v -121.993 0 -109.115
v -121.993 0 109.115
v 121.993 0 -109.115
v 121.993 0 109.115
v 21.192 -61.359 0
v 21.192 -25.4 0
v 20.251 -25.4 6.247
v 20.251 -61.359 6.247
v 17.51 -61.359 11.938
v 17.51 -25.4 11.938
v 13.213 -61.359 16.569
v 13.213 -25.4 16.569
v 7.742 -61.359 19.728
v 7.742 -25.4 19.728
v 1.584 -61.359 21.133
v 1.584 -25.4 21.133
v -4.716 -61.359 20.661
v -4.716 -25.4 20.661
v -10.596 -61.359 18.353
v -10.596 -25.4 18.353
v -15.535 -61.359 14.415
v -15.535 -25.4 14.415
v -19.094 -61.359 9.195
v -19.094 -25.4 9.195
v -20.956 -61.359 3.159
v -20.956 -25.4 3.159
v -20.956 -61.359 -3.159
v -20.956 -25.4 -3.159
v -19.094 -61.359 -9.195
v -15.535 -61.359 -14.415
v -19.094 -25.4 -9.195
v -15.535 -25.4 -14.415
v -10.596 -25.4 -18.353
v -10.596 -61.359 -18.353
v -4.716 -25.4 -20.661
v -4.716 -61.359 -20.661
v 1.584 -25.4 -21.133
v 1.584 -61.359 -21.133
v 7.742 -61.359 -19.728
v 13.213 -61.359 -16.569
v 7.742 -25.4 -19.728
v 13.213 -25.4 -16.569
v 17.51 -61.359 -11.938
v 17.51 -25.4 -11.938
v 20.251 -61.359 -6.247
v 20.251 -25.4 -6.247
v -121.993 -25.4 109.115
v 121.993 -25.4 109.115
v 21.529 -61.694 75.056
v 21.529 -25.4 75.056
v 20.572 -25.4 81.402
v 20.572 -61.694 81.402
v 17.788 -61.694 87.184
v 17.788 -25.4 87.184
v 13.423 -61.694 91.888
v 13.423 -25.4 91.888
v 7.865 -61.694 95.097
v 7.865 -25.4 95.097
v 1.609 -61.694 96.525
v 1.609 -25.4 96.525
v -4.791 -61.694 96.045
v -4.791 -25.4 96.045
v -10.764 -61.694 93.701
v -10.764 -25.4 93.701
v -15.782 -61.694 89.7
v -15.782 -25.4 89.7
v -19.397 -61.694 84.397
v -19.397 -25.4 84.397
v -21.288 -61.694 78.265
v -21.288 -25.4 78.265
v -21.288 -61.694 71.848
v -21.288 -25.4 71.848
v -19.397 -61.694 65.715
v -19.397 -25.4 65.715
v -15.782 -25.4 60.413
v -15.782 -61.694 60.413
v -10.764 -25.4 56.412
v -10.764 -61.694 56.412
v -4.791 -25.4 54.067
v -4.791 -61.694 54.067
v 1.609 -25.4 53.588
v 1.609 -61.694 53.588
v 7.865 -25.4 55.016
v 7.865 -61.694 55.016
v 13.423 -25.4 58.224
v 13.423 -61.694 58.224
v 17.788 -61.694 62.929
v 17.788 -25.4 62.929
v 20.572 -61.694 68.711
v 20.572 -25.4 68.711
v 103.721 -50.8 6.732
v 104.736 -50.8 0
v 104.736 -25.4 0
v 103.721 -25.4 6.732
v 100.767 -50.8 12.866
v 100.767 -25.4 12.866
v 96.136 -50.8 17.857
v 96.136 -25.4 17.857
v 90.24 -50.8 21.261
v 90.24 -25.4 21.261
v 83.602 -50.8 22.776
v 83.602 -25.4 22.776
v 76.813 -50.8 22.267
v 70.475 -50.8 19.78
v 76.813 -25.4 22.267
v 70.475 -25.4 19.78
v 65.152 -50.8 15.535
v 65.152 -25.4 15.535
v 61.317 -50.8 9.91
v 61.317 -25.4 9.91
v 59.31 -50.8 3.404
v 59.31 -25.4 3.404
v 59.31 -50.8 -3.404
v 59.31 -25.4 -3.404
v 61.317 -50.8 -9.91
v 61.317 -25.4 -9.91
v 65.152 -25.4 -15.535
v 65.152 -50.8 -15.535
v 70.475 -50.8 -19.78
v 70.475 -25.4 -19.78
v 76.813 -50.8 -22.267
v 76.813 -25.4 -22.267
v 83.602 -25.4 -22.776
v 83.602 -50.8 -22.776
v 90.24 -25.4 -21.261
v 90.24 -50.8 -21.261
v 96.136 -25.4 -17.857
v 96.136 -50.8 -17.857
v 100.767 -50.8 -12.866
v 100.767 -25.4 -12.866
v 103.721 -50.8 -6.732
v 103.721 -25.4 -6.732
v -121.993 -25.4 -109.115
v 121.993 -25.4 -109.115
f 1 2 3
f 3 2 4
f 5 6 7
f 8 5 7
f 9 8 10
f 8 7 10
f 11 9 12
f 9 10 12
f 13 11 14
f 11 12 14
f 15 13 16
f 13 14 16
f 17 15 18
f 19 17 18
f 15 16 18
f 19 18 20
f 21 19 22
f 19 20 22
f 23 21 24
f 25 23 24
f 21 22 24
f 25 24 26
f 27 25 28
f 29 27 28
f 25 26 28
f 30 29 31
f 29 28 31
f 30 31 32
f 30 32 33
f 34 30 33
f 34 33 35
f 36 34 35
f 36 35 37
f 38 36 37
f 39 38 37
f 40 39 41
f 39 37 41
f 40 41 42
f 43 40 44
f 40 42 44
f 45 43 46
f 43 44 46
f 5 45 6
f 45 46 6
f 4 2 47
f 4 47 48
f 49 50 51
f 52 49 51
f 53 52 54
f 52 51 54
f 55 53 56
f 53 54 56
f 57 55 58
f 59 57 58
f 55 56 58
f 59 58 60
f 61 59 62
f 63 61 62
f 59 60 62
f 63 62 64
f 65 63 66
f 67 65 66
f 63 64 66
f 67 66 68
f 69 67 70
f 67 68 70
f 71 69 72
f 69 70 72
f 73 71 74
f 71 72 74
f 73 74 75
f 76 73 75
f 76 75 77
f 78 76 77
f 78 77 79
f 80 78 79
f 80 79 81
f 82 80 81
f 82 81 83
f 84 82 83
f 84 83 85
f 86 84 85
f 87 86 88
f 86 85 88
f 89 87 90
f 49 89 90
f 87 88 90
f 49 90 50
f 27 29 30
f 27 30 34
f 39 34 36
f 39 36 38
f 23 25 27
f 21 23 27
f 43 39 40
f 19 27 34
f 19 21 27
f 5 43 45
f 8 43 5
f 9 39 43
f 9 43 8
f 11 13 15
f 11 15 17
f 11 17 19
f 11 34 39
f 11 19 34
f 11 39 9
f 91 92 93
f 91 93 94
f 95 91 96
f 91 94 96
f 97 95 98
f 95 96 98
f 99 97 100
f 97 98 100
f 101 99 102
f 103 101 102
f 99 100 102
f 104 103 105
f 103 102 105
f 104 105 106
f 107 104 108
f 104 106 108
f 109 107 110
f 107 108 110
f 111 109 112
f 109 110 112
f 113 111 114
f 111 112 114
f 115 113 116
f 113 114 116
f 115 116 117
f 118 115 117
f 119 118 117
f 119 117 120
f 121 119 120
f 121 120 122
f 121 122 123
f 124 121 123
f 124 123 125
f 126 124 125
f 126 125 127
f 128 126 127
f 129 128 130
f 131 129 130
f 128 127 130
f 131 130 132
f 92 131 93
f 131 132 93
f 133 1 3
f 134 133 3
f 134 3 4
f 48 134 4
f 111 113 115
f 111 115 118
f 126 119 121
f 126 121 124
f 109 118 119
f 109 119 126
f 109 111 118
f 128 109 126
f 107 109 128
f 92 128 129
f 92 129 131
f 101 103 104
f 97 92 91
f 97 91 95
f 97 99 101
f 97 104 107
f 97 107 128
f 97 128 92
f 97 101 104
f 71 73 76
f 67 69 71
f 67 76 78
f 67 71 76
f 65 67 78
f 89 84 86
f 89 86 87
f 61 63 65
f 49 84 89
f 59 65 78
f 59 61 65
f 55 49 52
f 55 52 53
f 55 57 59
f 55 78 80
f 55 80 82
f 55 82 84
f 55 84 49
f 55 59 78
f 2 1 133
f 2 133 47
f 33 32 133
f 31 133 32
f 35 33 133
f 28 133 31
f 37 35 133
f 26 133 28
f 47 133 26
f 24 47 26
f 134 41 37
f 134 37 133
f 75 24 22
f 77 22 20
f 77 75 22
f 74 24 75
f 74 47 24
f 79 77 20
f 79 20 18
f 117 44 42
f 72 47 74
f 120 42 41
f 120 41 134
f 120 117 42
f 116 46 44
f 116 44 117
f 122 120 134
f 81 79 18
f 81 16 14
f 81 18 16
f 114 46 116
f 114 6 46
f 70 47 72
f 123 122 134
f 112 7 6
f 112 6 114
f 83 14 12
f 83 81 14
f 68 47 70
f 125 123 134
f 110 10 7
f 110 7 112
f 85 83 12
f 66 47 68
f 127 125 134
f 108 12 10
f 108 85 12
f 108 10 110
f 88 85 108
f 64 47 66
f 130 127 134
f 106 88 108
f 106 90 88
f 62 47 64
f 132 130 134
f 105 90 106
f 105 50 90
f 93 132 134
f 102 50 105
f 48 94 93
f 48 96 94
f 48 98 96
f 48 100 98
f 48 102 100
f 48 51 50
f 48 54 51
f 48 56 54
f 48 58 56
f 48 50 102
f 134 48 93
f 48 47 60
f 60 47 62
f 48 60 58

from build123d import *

# Parameters (mm, degrees)
F0_W     = 243.986786
F0_H     = 218.229026
F1_DEPTH = 25.4
F2_R     = 21.192457
F3_DEPTH = 35.958676
F4_R     = 21.528867
F5_DEPTH = 36.293864
F6_R     = 22.840136
F7_DEPTH = 25.4


with BuildPart() as f1:
    # F0 (on Front) → F1 (new body)
    with BuildSketch(Plane.XZ):
        Rectangle(F0_W, F0_H)
    extrude(amount=F1_DEPTH)

    # F2 (on face) → F3 (join)
    with BuildSketch(Plane.XZ.offset(25.4)):
        Circle(F2_R)
    extrude(amount=F3_DEPTH)

    # F4 (on face) → F5 (join)
    with BuildSketch(Plane.XZ.offset(25.4)):
        with Locations((0, 75.056374)):
            Circle(F4_R)
    extrude(amount=F5_DEPTH)

    # F6 (on face) → F7 (join)
    with BuildSketch(Plane.XZ.offset(25.4)):
        with Locations((81.895486, 0)):
            Circle(F6_R)
    extrude(amount=F7_DEPTH)


solid = f1.part
